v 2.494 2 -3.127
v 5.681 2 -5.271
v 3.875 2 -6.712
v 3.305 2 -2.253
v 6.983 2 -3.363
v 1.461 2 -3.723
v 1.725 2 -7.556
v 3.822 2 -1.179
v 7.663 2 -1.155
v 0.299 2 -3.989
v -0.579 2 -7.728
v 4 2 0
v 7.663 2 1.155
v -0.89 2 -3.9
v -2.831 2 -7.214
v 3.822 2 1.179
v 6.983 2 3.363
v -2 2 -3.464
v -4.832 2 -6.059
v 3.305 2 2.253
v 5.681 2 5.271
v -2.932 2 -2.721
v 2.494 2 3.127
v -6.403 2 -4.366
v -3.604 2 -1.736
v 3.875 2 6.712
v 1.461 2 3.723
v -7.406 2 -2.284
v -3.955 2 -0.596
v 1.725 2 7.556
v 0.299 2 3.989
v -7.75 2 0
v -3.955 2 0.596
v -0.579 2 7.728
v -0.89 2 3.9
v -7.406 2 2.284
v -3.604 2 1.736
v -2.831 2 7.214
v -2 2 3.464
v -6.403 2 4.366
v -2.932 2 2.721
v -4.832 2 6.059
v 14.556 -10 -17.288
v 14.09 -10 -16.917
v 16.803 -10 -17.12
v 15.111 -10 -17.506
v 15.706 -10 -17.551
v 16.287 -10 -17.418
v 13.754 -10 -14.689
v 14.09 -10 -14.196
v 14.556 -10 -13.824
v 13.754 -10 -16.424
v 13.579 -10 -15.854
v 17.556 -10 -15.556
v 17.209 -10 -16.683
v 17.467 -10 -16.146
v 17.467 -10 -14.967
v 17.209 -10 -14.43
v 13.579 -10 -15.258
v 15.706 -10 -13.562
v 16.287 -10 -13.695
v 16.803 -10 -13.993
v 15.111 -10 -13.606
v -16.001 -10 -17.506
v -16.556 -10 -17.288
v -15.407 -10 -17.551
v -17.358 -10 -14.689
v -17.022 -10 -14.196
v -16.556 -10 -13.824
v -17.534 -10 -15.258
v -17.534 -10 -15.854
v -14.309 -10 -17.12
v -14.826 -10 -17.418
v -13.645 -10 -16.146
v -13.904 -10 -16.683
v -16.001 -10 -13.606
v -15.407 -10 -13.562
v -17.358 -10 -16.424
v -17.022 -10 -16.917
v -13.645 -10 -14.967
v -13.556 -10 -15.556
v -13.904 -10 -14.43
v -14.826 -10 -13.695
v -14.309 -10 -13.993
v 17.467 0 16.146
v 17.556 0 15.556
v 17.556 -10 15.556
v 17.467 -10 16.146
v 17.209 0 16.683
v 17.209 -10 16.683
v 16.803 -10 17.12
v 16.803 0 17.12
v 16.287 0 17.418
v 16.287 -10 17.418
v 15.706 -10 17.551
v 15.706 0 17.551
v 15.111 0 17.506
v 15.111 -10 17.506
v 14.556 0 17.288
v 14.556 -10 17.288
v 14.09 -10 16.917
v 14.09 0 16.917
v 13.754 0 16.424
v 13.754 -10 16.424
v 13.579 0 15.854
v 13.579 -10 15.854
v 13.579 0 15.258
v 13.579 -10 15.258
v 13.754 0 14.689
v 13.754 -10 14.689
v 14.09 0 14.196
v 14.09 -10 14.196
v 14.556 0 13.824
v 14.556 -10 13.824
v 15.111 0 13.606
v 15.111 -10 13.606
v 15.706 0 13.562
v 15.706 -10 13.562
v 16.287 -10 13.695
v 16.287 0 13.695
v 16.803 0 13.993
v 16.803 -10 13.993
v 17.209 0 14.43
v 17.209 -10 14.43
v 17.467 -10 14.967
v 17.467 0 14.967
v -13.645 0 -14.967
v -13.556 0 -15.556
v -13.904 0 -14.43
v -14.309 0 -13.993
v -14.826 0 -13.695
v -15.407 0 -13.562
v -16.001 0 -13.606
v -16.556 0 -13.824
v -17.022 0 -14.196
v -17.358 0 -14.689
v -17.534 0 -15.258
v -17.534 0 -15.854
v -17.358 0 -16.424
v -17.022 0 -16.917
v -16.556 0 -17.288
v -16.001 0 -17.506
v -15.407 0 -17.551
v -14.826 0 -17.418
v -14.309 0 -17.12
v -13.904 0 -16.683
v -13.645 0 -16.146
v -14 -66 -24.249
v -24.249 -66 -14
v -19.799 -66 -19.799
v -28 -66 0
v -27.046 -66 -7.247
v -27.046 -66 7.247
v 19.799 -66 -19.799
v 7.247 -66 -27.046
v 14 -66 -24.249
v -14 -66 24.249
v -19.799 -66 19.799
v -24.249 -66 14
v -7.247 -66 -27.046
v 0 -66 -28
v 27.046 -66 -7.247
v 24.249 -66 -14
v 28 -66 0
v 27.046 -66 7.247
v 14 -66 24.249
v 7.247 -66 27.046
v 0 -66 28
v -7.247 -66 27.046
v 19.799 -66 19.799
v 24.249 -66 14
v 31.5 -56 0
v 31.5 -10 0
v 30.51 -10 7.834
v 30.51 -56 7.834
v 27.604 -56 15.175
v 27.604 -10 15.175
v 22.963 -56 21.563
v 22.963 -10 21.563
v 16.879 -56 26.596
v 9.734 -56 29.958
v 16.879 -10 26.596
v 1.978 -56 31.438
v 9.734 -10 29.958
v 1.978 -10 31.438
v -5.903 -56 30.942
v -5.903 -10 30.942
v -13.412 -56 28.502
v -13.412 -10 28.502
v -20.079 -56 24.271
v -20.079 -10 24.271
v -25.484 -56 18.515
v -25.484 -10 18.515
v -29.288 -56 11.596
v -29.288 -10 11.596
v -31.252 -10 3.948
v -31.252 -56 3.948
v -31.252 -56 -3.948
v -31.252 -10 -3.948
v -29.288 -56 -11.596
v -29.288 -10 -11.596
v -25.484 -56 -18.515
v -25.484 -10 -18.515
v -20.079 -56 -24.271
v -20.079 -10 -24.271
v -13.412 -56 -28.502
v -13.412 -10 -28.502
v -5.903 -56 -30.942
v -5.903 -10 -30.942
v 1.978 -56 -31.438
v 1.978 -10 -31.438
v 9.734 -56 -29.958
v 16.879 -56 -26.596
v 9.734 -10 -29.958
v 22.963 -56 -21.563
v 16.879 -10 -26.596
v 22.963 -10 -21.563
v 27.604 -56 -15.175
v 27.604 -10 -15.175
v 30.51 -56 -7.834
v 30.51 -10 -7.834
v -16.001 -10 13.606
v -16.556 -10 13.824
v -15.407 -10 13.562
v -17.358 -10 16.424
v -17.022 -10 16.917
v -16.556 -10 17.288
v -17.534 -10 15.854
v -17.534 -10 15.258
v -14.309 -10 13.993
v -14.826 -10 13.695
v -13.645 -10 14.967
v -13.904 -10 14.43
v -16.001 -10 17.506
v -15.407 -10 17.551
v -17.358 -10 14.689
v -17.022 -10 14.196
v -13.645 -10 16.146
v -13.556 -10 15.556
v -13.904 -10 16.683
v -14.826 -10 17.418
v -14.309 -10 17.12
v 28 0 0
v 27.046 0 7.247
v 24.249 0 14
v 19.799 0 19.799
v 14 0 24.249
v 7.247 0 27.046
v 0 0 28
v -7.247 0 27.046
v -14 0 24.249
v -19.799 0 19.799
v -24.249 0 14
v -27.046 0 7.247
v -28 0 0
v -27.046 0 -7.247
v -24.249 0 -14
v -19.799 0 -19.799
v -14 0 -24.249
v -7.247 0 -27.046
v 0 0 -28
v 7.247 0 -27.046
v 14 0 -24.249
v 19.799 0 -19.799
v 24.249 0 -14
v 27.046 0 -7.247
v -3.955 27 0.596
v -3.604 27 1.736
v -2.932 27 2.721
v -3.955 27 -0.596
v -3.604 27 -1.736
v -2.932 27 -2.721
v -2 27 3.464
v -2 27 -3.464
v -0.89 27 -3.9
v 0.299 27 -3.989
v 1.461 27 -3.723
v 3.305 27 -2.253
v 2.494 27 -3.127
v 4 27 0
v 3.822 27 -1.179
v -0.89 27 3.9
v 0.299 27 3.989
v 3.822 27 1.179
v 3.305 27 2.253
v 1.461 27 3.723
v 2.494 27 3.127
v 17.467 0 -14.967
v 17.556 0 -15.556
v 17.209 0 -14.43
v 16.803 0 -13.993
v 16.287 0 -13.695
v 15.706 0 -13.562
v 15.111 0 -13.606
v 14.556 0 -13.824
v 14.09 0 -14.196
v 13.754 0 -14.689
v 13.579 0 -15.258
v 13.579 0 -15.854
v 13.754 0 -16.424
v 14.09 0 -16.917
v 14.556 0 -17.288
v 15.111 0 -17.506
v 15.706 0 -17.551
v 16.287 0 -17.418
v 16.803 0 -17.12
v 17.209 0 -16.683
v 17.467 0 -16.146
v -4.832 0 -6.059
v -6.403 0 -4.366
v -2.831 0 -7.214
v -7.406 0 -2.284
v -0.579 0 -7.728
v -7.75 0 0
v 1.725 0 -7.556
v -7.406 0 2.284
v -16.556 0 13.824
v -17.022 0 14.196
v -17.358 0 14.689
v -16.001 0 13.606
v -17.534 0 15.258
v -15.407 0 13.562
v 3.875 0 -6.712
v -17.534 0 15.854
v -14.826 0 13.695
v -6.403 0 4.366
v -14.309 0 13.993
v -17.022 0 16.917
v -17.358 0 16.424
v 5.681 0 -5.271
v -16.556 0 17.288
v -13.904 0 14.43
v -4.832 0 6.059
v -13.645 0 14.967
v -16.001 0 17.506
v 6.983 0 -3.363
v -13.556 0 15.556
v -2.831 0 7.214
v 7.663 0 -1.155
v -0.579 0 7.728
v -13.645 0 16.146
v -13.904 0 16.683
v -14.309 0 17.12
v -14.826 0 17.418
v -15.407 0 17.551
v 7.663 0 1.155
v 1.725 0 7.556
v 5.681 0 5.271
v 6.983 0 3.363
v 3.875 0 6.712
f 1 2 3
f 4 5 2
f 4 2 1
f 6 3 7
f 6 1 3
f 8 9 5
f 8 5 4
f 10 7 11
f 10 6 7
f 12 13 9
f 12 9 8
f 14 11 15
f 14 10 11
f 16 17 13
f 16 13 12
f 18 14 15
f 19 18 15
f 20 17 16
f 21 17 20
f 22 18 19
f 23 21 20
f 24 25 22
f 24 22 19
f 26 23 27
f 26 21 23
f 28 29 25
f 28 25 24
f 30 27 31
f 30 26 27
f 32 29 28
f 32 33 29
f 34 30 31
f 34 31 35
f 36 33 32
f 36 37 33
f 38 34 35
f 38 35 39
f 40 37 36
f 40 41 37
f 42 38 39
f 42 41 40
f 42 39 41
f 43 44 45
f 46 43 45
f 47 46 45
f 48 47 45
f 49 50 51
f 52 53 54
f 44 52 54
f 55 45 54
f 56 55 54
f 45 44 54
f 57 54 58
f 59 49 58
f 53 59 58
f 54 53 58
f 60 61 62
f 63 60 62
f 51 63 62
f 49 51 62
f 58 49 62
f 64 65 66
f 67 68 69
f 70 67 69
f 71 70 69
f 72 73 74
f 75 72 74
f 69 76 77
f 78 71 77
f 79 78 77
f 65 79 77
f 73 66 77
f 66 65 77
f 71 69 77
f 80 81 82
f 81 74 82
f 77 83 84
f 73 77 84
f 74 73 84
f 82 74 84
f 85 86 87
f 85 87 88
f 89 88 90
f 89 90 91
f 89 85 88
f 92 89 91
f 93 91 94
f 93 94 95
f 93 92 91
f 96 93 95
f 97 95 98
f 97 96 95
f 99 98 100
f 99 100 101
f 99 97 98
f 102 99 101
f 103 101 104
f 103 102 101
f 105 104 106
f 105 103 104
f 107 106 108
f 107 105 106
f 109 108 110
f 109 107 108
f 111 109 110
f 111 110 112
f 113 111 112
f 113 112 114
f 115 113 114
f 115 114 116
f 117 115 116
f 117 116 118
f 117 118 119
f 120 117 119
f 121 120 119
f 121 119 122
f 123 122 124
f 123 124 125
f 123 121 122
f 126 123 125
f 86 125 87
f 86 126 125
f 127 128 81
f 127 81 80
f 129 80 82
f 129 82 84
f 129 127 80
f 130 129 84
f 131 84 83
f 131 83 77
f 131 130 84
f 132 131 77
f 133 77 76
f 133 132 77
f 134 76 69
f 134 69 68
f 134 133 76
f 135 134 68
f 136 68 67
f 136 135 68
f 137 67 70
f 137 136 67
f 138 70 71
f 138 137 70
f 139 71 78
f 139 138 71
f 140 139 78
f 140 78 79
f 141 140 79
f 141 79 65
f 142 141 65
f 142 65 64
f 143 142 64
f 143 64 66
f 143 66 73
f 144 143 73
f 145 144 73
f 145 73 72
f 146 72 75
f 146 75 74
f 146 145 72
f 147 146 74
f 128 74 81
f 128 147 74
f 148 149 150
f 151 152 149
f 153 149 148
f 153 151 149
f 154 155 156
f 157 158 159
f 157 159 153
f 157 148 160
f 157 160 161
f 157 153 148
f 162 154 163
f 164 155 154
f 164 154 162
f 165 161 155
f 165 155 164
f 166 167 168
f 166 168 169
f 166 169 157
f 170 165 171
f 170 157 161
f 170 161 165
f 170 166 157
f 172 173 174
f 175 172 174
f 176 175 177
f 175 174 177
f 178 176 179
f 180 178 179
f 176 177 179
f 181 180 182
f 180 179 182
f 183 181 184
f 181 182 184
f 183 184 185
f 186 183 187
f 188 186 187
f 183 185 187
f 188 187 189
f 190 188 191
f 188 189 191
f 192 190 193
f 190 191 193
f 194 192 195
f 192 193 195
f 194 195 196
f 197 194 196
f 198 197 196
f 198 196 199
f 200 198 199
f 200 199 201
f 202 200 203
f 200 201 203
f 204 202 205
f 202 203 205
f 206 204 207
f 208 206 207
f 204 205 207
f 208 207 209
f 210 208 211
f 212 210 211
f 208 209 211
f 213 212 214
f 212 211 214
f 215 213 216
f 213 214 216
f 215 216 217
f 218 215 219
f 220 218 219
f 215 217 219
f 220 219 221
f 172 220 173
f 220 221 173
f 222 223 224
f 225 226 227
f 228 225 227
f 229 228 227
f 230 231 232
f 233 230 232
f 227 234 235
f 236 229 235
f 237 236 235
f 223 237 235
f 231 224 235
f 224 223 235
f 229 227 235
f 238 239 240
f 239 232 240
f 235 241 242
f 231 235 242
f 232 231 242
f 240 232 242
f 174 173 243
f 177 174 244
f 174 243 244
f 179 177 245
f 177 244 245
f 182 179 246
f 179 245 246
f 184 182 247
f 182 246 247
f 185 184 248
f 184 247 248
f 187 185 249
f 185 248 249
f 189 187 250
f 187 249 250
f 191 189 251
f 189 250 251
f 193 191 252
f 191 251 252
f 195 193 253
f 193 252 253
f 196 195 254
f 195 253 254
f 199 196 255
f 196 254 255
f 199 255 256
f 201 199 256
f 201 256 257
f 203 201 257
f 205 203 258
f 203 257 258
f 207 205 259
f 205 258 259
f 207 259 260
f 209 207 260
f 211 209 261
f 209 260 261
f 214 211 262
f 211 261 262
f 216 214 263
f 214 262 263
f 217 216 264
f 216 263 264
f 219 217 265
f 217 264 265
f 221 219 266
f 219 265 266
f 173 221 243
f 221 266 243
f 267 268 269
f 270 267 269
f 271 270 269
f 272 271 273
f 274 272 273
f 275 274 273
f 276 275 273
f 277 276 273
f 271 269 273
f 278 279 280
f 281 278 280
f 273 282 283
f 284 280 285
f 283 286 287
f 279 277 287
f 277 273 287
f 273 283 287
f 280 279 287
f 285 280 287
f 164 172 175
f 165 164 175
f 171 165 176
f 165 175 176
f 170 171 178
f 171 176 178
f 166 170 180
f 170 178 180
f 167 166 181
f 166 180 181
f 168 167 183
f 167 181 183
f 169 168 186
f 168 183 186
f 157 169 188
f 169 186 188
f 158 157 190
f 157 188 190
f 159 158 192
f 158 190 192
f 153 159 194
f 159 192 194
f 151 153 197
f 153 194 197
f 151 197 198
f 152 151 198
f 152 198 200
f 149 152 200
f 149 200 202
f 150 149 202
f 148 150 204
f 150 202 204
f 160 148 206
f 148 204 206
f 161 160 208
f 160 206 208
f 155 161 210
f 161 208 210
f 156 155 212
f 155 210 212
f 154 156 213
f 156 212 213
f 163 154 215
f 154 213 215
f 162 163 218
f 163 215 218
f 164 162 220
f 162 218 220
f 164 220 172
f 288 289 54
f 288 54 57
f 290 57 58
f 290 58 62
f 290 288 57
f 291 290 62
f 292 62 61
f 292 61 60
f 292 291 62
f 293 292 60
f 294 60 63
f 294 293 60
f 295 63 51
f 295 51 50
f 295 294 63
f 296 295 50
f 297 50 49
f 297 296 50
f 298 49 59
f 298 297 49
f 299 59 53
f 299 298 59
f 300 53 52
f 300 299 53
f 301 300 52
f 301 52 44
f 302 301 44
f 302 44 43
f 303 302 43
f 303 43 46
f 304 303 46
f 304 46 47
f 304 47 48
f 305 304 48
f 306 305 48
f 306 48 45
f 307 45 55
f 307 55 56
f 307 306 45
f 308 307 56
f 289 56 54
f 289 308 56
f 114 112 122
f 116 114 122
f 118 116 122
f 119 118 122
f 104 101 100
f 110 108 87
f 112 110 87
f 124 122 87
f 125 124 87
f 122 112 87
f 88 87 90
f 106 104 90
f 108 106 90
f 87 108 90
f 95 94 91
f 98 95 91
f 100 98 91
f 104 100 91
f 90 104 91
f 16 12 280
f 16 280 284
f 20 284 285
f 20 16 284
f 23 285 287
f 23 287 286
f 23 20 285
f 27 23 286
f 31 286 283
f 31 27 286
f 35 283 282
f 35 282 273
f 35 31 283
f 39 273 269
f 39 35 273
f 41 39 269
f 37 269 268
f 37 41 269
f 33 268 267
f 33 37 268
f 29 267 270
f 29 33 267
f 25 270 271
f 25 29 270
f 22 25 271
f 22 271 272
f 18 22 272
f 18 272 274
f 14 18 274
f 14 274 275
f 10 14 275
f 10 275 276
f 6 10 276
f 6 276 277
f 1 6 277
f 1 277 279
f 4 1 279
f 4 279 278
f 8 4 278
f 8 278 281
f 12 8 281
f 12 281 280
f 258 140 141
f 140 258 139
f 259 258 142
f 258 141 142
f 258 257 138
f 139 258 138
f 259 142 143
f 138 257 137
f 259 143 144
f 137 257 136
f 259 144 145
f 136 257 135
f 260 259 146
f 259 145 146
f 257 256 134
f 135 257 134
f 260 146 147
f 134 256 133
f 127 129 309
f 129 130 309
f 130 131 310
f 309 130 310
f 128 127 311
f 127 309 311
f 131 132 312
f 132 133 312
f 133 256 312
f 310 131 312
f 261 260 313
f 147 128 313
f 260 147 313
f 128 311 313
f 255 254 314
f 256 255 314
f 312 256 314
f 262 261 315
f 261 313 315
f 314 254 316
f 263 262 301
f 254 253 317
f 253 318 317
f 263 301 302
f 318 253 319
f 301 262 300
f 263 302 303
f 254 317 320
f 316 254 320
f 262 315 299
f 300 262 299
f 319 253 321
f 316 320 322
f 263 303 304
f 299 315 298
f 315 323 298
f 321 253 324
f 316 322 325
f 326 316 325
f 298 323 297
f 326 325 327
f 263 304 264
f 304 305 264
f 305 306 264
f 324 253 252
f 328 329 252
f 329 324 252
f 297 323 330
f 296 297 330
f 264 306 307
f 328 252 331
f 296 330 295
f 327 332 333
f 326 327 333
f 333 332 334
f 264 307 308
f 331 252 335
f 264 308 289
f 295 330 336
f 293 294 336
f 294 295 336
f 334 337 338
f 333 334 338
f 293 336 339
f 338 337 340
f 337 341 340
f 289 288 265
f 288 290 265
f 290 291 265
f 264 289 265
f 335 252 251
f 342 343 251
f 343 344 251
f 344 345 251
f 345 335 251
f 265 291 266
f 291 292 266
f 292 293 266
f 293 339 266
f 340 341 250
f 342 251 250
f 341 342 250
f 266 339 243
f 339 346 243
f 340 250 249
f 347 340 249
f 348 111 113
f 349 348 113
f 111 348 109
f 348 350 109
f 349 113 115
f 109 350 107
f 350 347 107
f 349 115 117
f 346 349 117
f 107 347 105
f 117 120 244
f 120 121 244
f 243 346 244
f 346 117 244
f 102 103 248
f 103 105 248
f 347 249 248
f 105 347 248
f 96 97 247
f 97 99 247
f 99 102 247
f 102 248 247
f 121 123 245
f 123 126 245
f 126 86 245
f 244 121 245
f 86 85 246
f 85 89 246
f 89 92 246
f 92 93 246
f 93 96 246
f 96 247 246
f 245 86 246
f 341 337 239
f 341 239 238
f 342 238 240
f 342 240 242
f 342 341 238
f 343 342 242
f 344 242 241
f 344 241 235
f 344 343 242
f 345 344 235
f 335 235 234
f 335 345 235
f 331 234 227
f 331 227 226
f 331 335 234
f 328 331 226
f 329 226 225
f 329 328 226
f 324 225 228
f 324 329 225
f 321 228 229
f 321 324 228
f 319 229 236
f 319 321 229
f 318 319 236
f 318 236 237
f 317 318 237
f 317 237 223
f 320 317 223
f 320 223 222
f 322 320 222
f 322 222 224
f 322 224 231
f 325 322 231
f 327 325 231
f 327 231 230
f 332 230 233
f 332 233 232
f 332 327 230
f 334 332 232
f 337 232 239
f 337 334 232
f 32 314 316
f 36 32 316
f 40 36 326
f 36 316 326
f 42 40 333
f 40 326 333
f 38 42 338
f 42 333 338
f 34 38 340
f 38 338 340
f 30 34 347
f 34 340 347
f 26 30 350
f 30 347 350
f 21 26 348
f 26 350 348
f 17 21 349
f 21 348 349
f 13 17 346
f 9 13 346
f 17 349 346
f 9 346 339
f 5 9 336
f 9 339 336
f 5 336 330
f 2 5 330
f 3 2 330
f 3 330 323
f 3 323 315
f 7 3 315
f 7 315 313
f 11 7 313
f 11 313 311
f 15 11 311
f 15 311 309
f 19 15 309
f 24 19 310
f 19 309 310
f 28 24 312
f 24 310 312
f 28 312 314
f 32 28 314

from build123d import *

# Parameters (mm, degrees)
F0_R     = 31.5
F0_R_2   = 2
F0_R_3   = 4
F1_DEPTH = 66
F2_DEPTH = 27
F3_DEPTH = 10
F4_SIZE2 = 3.5
F4_SIZE  = 10
F5_SIZE2 = 10
F5_SIZE  = 3.5
F6_R     = 7.75
F6_R_2   = 4
F7_DEPTH = 2


with BuildPart() as f1:
    # F0 (on Front) → F1 (new body)
    with BuildSketch(Plane.XZ):
        Circle(F0_R)
        with Locations((-15.5563491861, -15.5563491861)):
            Circle(F0_R_2, mode=Mode.SUBTRACT)
        with Locations((15.5563491861, -15.5563491861)):
            Circle(F0_R_2, mode=Mode.SUBTRACT)
        with Locations((-15.5563491861, 15.5563491861)):
            Circle(F0_R_2, mode=Mode.SUBTRACT)
        Circle(F0_R_3, mode=Mode.SUBTRACT)
        with Locations((15.5563491861, 15.5563491861)):
            Circle(F0_R_2, mode=Mode.SUBTRACT)
        Circle(F0_R_3)
        with Locations((15.5563491861, 15.5563491861)):
            Circle(F0_R_2)
        with Locations((-15.5563491861, 15.5563491861)):
            Circle(F0_R_2)
        with Locations((-15.5563491861, -15.5563491861)):
            Circle(F0_R_2)
        with Locations((15.5563491861, -15.5563491861)):
            Circle(F0_R_2)
    extrude(amount=F1_DEPTH)

    # F0 (on Front) → F2 (join)
    with BuildSketch(Plane.XZ):
        Circle(F0_R_3)
    extrude(amount=-F2_DEPTH)

    # F0 (on Front) → F3 (cut)
    with BuildSketch(Plane.XZ):
        with Locations((15.5563491861, 15.5563491861)):
            Circle(F0_R_2)
        with Locations((-15.5563491861, 15.5563491861)):
            Circle(F0_R_2)
        with Locations((15.5563491861, -15.5563491861)):
            Circle(F0_R_2)
        with Locations((-15.5563491861, -15.5563491861)):
            Circle(F0_R_2)
    extrude(amount=F3_DEPTH, mode=Mode.SUBTRACT)

    # F4
    f4_edges = [f1.edges().sort_by_distance(p)[0] for p in [
        (-31.5, 0, 0),
    ]]
    f4_side = f1.faces().sort_by_distance((-31.5, -33, 0))[0]
    chamfer(f4_edges, length=F4_SIZE, length2=F4_SIZE2, reference=f4_side)

    # F5
    f5_edges = [f1.edges().sort_by_distance(p)[0] for p in [
        (-31.5, -66, 0),
    ]]
    f5_side = f1.faces().sort_by_distance((0, -66, 0))[0]
    chamfer(f5_edges, length=F5_SIZE, length2=F5_SIZE2, reference=f5_side)

    # F6 (on face) → F7 (join)
    with BuildSketch(Plane(origin=(0, 0, 0), x_dir=(-1, 0, 0), z_dir=(0, 1, 0))):
        Circle(F6_R)
        Circle(F6_R_2, mode=Mode.SUBTRACT)
    extrude(amount=F7_DEPTH)


solid = f1.part
